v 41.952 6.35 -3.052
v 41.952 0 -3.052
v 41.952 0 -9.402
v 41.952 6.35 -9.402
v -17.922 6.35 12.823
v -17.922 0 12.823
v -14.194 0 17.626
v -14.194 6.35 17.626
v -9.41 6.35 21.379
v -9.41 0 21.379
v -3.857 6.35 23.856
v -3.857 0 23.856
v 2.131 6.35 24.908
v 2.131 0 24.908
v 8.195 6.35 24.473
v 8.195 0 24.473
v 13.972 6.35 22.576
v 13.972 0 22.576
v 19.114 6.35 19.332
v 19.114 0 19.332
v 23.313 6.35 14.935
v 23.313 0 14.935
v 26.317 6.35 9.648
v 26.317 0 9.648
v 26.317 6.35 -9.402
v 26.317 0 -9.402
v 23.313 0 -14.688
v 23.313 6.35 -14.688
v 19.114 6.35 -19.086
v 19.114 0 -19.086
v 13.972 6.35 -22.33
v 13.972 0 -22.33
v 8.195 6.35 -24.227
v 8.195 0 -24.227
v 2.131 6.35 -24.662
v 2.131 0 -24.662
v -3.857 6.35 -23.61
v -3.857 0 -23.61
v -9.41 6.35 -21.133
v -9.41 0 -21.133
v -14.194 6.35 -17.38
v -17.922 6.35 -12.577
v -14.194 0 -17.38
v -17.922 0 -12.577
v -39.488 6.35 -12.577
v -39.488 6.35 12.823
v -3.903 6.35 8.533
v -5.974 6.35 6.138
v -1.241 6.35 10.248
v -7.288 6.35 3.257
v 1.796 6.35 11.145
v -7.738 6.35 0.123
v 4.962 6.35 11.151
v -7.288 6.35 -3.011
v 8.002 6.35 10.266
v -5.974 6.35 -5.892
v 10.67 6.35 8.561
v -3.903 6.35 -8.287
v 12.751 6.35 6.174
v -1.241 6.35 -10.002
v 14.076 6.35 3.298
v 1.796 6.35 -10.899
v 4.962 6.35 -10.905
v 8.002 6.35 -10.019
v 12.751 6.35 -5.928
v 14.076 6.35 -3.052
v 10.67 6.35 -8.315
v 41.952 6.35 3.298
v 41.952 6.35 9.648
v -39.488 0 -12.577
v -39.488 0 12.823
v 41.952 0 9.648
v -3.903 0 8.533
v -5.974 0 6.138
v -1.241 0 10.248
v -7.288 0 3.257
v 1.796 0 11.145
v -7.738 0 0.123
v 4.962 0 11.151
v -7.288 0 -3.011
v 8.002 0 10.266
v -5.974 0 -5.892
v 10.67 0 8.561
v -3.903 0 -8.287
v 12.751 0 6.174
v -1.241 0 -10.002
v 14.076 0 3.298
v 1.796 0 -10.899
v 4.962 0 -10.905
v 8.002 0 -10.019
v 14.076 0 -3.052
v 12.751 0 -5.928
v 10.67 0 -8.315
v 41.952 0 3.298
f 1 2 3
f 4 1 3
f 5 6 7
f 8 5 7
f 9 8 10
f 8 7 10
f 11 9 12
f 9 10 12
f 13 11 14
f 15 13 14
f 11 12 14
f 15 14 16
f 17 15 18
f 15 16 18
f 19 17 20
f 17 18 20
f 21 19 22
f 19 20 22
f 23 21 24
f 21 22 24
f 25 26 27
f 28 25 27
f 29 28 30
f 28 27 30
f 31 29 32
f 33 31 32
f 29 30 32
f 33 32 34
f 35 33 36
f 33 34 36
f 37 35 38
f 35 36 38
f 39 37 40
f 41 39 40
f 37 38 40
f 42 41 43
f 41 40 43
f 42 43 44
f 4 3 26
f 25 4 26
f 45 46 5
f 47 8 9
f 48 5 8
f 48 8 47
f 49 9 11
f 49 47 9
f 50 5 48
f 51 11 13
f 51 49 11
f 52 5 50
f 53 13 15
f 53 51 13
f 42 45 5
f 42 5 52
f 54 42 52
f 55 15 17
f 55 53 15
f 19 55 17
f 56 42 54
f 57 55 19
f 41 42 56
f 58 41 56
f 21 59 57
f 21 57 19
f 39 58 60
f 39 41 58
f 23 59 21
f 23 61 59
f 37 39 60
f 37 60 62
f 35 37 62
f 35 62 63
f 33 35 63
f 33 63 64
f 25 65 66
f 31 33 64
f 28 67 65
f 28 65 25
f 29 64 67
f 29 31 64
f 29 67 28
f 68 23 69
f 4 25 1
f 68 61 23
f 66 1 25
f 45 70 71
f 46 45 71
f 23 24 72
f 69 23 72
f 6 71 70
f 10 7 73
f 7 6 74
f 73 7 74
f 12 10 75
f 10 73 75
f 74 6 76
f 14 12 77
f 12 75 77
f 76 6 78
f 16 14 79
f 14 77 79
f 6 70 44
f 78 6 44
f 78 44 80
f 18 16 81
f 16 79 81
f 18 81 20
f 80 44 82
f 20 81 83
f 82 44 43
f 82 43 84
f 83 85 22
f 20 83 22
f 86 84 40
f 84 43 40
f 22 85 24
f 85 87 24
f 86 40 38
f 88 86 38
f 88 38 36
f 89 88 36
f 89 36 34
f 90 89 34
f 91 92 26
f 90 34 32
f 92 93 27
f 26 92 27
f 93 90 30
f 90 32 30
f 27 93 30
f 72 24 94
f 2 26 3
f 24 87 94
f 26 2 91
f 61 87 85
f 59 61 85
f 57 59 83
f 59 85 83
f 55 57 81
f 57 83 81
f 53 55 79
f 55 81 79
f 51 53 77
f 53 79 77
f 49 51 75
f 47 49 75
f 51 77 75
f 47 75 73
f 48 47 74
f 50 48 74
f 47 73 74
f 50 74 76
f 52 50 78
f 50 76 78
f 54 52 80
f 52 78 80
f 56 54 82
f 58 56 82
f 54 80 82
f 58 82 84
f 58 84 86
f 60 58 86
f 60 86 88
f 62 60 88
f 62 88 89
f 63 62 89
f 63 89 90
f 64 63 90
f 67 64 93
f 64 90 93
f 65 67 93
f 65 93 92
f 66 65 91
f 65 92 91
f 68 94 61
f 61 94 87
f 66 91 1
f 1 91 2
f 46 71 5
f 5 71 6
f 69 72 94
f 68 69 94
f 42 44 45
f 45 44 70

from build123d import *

# Parameters (mm, degrees)
BOSS_EXTRUDE1_DEPTH = 6.35


with BuildPart() as part:
    # Sketch1 → Boss-Extrude1 (new body)
    with BuildSketch(Plane(origin=(0, 0, 0), x_dir=(1, 0, 0), z_dir=(0, 1, 0))):
        with BuildLine():
            Line((-33.137943546, 12.576818285), (-39.487943546, 12.576818285))
            Line((-39.487943546, 12.576818285), (-39.487943546, -12.823181715))
            Line((-39.487943546, -12.823181715), (-33.137943546, -12.823181715))
            Line((-33.137943546, -12.823181715), (-17.921975594, -12.823181715))
            ThreePointArc((-17.921975594, -12.823181715), (5.176532213, -24.877142303), (26.316962394, -9.648181715))
            Line((26.316962394, -9.648181715), (41.951577839, -9.648181715))
            Line((41.951577839, -9.648181715), (41.951577839, -3.298181715))
            Line((41.951577839, -3.298181715), (14.07573237, -3.298181715))
            ThreePointArc((14.07573237, -3.298181715), (-7.737943546, -0.123181715), (14.07573237, 3.051818285))
            Line((14.07573237, 3.051818285), (41.951577839, 3.051818285))
            Line((41.951577839, 3.051818285), (41.951577839, 9.401818285))
            Line((41.951577839, 9.401818285), (26.316962394, 9.401818285))
            ThreePointArc((26.316962394, 9.401818285), (5.176532213, 24.630778874), (-17.921975594, 12.576818285))
            Line((-17.921975594, 12.576818285), (-33.137943546, 12.576818285))
        make_face()
    extrude(amount=BOSS_EXTRUDE1_DEPTH)


solid = part.part
